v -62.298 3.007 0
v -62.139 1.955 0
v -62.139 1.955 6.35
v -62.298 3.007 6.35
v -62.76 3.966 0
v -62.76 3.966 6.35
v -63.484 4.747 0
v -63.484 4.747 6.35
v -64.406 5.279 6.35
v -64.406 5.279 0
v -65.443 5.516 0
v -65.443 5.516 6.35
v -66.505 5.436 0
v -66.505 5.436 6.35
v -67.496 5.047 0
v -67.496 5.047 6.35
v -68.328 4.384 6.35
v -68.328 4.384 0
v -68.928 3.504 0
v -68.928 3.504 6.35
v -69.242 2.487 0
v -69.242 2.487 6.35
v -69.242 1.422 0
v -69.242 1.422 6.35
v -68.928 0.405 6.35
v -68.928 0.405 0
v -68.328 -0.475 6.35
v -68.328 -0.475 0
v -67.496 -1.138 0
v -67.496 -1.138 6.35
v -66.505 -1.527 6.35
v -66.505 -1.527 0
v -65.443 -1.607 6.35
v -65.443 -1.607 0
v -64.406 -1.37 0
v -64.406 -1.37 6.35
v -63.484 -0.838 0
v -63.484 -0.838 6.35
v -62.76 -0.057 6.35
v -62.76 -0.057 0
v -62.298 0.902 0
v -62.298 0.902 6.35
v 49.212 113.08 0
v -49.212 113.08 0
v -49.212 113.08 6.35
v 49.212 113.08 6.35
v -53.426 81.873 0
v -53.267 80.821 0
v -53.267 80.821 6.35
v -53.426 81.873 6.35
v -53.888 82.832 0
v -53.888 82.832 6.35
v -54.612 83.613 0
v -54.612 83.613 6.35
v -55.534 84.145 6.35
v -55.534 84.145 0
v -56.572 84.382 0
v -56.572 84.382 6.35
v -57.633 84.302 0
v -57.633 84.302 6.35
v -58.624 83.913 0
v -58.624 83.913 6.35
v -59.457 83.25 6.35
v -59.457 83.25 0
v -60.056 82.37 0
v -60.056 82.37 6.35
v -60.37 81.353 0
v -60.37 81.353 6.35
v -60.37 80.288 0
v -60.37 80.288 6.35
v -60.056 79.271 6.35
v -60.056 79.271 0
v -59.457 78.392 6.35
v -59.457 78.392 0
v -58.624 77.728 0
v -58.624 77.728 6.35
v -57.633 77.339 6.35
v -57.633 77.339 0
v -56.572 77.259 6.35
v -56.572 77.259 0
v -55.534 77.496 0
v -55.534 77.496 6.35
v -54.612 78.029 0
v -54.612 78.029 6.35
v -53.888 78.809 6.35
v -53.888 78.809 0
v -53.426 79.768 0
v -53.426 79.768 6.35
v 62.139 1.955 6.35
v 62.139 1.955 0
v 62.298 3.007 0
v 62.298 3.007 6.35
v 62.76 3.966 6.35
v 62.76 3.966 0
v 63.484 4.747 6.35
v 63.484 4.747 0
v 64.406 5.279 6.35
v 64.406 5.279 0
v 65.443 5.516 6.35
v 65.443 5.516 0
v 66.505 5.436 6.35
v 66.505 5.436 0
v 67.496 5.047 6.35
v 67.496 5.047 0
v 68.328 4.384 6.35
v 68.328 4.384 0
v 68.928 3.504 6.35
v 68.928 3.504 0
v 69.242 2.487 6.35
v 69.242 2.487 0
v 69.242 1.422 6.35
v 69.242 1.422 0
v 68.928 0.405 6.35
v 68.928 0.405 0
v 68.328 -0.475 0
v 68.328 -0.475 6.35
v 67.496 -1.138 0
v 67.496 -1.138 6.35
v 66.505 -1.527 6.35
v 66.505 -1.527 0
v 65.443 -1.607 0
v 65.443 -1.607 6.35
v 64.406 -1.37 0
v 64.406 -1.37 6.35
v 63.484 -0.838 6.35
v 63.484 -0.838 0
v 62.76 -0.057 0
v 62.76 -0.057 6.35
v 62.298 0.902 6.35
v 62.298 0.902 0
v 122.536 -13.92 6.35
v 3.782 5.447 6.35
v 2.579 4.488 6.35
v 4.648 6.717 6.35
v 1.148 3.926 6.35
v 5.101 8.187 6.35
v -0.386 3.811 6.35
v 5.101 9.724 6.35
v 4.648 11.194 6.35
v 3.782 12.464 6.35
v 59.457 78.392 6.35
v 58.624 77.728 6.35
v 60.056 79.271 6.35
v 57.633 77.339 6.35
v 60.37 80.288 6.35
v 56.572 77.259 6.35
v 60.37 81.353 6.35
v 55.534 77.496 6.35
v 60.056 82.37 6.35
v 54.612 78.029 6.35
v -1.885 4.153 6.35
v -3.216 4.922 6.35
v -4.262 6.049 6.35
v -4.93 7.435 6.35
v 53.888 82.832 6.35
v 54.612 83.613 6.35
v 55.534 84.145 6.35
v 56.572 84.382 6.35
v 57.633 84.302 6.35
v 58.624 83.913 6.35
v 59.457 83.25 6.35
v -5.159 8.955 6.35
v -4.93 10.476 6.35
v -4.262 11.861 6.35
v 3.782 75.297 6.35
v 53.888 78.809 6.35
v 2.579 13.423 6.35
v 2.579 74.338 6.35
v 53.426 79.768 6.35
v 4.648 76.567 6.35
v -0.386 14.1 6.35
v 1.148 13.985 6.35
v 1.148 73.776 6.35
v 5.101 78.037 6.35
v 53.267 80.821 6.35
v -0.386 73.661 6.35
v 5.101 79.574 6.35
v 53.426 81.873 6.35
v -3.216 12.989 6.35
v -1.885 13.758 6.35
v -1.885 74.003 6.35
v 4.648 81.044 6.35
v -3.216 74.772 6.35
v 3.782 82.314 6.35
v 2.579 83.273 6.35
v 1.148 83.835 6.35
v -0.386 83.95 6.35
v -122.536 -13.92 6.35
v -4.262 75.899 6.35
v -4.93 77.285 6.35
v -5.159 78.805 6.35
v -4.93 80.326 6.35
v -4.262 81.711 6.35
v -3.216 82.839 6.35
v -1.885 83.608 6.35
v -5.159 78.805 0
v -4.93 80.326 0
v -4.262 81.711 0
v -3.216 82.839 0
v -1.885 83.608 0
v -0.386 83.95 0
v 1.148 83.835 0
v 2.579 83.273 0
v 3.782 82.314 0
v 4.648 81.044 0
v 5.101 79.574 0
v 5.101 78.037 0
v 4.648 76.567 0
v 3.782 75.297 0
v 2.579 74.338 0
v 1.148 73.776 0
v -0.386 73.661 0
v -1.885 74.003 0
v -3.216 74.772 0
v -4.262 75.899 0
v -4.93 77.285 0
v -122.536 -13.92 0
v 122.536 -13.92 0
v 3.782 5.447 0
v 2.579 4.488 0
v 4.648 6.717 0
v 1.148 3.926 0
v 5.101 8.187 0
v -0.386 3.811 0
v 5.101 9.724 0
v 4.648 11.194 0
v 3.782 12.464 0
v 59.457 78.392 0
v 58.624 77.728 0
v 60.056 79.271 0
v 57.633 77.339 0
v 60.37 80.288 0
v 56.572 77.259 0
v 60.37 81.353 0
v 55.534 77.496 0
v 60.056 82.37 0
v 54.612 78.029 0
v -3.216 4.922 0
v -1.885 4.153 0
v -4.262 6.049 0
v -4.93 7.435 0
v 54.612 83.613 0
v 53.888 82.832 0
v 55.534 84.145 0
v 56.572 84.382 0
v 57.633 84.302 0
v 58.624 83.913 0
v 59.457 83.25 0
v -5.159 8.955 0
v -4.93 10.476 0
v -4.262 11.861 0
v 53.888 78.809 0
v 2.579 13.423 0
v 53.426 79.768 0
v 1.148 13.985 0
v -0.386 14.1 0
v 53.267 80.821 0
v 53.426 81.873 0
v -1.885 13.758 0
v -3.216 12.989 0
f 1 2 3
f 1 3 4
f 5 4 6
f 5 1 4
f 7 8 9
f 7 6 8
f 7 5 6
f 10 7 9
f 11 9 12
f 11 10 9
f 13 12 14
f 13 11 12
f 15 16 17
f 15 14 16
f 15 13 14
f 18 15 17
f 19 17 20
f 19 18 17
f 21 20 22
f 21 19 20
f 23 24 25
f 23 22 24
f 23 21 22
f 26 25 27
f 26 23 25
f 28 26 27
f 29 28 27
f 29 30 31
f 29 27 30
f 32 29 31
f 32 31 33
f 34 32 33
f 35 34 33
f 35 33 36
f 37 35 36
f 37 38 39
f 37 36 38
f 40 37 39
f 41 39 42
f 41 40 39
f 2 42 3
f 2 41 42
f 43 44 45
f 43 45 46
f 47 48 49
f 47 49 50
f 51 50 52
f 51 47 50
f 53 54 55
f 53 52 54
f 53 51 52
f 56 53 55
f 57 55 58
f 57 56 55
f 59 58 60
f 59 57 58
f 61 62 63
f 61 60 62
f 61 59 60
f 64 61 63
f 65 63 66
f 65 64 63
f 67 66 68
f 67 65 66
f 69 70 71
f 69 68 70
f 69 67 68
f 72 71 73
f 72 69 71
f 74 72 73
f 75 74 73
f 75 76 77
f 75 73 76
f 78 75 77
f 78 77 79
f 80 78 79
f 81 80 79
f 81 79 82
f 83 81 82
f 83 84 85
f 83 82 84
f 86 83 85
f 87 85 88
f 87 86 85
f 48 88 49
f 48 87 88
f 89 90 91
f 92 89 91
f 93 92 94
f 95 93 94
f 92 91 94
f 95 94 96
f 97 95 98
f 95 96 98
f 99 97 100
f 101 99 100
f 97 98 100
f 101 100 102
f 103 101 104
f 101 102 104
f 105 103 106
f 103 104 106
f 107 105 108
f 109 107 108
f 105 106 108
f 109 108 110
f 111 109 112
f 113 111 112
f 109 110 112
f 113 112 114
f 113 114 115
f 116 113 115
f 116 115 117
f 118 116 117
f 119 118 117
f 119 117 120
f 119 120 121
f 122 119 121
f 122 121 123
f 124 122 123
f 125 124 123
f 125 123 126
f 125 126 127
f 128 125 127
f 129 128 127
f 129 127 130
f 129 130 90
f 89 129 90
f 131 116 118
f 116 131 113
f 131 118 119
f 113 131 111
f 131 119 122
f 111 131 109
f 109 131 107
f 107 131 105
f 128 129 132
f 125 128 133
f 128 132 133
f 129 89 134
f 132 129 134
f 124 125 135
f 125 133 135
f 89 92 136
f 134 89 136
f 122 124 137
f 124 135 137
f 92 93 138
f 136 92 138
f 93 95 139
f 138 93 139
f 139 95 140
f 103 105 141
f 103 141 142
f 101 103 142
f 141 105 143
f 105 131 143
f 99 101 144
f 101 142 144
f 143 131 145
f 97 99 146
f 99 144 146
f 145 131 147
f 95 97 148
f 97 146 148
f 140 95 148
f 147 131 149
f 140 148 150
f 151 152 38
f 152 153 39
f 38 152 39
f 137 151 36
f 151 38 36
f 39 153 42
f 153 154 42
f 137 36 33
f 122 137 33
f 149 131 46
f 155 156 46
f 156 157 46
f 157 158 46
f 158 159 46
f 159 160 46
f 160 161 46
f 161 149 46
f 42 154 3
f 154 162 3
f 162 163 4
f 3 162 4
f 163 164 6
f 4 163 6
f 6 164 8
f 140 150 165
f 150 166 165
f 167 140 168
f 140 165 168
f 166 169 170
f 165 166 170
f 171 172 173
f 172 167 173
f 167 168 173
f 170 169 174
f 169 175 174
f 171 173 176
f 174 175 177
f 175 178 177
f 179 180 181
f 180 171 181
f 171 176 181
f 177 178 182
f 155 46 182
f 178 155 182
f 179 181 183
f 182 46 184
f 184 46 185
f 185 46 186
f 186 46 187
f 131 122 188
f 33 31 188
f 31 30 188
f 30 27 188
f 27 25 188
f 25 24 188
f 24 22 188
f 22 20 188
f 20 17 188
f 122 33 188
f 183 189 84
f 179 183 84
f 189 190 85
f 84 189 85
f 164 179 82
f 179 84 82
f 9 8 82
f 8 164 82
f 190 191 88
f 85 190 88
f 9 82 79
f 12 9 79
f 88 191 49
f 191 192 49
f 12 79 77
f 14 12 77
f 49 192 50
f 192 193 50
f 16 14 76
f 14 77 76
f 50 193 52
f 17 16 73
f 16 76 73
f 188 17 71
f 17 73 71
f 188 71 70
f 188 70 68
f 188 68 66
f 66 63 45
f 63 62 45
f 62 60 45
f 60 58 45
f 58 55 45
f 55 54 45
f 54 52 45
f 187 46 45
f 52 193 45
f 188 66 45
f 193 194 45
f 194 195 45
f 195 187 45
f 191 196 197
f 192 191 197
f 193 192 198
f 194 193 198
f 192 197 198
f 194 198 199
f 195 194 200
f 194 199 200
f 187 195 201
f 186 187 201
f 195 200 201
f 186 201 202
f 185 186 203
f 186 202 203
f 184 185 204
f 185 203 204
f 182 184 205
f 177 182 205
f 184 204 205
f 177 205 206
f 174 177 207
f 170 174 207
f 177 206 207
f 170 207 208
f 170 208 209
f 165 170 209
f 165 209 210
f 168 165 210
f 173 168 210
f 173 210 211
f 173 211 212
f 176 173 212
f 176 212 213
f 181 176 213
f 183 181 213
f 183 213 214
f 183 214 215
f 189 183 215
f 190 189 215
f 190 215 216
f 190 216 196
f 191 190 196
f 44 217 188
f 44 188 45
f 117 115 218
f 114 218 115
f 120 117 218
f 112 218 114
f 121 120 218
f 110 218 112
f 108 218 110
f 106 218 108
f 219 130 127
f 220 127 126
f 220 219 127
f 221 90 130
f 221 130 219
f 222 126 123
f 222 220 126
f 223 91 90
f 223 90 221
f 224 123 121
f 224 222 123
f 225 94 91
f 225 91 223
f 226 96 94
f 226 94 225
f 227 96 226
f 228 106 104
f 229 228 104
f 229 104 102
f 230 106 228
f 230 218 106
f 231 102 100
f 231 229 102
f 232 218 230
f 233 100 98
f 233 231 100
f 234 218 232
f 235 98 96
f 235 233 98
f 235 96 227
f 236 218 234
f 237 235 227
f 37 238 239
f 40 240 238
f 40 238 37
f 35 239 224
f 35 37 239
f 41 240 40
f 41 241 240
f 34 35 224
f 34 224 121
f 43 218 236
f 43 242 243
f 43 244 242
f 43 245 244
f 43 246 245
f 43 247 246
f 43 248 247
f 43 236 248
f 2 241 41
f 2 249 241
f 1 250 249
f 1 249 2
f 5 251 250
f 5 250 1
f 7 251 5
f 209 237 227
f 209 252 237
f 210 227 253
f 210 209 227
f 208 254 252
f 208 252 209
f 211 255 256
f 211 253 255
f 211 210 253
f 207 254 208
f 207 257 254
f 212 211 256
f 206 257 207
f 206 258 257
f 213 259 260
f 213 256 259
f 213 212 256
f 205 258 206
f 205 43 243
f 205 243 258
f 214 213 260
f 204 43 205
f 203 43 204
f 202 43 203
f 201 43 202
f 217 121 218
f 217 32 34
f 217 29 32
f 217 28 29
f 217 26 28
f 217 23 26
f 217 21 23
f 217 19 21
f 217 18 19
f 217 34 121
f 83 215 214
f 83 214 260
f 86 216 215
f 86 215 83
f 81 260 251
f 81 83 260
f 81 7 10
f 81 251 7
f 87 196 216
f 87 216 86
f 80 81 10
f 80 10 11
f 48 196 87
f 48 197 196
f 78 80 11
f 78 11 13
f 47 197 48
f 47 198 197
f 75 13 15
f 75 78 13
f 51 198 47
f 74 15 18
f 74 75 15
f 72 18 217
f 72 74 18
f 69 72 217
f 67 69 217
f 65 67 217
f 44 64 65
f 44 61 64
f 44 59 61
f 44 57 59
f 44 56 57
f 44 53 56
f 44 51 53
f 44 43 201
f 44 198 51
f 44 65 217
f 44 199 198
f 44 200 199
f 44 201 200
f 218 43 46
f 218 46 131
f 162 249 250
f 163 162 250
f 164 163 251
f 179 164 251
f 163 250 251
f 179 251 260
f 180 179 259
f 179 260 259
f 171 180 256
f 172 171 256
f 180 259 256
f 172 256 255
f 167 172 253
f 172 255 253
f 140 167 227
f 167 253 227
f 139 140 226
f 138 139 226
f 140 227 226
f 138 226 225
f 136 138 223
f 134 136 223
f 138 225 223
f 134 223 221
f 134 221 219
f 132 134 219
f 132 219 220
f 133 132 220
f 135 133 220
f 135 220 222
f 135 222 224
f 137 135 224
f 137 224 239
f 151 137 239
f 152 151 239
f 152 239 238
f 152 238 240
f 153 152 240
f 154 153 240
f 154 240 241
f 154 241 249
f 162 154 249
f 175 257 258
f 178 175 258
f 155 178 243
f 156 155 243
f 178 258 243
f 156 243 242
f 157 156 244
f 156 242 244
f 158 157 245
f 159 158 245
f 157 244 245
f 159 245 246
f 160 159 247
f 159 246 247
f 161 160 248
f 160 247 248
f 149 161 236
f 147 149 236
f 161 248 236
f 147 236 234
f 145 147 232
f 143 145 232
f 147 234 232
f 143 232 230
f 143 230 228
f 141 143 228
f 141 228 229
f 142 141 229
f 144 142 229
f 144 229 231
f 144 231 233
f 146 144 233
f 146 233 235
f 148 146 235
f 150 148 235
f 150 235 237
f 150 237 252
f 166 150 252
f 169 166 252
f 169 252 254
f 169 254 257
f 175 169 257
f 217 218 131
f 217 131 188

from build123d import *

# Parameters (mm, degrees)
BOSS_EXTRUDE1_DEPTH     = 6.35
F_3_8_CLEARANCE_HOLE1_D = 10.31748
F_1_4_CLEARANCE_HOLE1_D = 7.14248


with BuildPart() as part:
    # Sketch1 → Boss-Extrude1 (new body)
    with BuildSketch(Plane.XY):
        Polygon((-49.2125, 113.079516789), (49.2125, 113.079516789), (122.535984187, -13.920483211), (-122.535984187, -13.920483211), align=None)
    extrude(amount=BOSS_EXTRUDE1_DEPTH)

    # 3/8 Clearance Hole1 (through all)
    with Locations(Plane.XY.offset(6.35)):
        with Locations((0, 78.805444667), (0, 8.955444667)):
            Hole(F_3_8_CLEARANCE_HOLE1_D / 2)

    # 1/4 Clearance Hole1 (through all)
    with Locations(Plane.XY.offset(6.35)):
        with Locations((65.710283942, 1.954516789), (56.838608029, 80.820710219)):
            f_1_4_clearance_hole1 = Hole(F_1_4_CLEARANCE_HOLE1_D / 2)

    # Mirror1: 1/4 Clearance Hole1 across plane
    add(f_1_4_clearance_hole1.mirror(Plane(origin=(0, 0, 0), x_dir=(0, 0, 1), z_dir=(1, 0, 0))), mode=Mode.SUBTRACT)


solid = part.part
